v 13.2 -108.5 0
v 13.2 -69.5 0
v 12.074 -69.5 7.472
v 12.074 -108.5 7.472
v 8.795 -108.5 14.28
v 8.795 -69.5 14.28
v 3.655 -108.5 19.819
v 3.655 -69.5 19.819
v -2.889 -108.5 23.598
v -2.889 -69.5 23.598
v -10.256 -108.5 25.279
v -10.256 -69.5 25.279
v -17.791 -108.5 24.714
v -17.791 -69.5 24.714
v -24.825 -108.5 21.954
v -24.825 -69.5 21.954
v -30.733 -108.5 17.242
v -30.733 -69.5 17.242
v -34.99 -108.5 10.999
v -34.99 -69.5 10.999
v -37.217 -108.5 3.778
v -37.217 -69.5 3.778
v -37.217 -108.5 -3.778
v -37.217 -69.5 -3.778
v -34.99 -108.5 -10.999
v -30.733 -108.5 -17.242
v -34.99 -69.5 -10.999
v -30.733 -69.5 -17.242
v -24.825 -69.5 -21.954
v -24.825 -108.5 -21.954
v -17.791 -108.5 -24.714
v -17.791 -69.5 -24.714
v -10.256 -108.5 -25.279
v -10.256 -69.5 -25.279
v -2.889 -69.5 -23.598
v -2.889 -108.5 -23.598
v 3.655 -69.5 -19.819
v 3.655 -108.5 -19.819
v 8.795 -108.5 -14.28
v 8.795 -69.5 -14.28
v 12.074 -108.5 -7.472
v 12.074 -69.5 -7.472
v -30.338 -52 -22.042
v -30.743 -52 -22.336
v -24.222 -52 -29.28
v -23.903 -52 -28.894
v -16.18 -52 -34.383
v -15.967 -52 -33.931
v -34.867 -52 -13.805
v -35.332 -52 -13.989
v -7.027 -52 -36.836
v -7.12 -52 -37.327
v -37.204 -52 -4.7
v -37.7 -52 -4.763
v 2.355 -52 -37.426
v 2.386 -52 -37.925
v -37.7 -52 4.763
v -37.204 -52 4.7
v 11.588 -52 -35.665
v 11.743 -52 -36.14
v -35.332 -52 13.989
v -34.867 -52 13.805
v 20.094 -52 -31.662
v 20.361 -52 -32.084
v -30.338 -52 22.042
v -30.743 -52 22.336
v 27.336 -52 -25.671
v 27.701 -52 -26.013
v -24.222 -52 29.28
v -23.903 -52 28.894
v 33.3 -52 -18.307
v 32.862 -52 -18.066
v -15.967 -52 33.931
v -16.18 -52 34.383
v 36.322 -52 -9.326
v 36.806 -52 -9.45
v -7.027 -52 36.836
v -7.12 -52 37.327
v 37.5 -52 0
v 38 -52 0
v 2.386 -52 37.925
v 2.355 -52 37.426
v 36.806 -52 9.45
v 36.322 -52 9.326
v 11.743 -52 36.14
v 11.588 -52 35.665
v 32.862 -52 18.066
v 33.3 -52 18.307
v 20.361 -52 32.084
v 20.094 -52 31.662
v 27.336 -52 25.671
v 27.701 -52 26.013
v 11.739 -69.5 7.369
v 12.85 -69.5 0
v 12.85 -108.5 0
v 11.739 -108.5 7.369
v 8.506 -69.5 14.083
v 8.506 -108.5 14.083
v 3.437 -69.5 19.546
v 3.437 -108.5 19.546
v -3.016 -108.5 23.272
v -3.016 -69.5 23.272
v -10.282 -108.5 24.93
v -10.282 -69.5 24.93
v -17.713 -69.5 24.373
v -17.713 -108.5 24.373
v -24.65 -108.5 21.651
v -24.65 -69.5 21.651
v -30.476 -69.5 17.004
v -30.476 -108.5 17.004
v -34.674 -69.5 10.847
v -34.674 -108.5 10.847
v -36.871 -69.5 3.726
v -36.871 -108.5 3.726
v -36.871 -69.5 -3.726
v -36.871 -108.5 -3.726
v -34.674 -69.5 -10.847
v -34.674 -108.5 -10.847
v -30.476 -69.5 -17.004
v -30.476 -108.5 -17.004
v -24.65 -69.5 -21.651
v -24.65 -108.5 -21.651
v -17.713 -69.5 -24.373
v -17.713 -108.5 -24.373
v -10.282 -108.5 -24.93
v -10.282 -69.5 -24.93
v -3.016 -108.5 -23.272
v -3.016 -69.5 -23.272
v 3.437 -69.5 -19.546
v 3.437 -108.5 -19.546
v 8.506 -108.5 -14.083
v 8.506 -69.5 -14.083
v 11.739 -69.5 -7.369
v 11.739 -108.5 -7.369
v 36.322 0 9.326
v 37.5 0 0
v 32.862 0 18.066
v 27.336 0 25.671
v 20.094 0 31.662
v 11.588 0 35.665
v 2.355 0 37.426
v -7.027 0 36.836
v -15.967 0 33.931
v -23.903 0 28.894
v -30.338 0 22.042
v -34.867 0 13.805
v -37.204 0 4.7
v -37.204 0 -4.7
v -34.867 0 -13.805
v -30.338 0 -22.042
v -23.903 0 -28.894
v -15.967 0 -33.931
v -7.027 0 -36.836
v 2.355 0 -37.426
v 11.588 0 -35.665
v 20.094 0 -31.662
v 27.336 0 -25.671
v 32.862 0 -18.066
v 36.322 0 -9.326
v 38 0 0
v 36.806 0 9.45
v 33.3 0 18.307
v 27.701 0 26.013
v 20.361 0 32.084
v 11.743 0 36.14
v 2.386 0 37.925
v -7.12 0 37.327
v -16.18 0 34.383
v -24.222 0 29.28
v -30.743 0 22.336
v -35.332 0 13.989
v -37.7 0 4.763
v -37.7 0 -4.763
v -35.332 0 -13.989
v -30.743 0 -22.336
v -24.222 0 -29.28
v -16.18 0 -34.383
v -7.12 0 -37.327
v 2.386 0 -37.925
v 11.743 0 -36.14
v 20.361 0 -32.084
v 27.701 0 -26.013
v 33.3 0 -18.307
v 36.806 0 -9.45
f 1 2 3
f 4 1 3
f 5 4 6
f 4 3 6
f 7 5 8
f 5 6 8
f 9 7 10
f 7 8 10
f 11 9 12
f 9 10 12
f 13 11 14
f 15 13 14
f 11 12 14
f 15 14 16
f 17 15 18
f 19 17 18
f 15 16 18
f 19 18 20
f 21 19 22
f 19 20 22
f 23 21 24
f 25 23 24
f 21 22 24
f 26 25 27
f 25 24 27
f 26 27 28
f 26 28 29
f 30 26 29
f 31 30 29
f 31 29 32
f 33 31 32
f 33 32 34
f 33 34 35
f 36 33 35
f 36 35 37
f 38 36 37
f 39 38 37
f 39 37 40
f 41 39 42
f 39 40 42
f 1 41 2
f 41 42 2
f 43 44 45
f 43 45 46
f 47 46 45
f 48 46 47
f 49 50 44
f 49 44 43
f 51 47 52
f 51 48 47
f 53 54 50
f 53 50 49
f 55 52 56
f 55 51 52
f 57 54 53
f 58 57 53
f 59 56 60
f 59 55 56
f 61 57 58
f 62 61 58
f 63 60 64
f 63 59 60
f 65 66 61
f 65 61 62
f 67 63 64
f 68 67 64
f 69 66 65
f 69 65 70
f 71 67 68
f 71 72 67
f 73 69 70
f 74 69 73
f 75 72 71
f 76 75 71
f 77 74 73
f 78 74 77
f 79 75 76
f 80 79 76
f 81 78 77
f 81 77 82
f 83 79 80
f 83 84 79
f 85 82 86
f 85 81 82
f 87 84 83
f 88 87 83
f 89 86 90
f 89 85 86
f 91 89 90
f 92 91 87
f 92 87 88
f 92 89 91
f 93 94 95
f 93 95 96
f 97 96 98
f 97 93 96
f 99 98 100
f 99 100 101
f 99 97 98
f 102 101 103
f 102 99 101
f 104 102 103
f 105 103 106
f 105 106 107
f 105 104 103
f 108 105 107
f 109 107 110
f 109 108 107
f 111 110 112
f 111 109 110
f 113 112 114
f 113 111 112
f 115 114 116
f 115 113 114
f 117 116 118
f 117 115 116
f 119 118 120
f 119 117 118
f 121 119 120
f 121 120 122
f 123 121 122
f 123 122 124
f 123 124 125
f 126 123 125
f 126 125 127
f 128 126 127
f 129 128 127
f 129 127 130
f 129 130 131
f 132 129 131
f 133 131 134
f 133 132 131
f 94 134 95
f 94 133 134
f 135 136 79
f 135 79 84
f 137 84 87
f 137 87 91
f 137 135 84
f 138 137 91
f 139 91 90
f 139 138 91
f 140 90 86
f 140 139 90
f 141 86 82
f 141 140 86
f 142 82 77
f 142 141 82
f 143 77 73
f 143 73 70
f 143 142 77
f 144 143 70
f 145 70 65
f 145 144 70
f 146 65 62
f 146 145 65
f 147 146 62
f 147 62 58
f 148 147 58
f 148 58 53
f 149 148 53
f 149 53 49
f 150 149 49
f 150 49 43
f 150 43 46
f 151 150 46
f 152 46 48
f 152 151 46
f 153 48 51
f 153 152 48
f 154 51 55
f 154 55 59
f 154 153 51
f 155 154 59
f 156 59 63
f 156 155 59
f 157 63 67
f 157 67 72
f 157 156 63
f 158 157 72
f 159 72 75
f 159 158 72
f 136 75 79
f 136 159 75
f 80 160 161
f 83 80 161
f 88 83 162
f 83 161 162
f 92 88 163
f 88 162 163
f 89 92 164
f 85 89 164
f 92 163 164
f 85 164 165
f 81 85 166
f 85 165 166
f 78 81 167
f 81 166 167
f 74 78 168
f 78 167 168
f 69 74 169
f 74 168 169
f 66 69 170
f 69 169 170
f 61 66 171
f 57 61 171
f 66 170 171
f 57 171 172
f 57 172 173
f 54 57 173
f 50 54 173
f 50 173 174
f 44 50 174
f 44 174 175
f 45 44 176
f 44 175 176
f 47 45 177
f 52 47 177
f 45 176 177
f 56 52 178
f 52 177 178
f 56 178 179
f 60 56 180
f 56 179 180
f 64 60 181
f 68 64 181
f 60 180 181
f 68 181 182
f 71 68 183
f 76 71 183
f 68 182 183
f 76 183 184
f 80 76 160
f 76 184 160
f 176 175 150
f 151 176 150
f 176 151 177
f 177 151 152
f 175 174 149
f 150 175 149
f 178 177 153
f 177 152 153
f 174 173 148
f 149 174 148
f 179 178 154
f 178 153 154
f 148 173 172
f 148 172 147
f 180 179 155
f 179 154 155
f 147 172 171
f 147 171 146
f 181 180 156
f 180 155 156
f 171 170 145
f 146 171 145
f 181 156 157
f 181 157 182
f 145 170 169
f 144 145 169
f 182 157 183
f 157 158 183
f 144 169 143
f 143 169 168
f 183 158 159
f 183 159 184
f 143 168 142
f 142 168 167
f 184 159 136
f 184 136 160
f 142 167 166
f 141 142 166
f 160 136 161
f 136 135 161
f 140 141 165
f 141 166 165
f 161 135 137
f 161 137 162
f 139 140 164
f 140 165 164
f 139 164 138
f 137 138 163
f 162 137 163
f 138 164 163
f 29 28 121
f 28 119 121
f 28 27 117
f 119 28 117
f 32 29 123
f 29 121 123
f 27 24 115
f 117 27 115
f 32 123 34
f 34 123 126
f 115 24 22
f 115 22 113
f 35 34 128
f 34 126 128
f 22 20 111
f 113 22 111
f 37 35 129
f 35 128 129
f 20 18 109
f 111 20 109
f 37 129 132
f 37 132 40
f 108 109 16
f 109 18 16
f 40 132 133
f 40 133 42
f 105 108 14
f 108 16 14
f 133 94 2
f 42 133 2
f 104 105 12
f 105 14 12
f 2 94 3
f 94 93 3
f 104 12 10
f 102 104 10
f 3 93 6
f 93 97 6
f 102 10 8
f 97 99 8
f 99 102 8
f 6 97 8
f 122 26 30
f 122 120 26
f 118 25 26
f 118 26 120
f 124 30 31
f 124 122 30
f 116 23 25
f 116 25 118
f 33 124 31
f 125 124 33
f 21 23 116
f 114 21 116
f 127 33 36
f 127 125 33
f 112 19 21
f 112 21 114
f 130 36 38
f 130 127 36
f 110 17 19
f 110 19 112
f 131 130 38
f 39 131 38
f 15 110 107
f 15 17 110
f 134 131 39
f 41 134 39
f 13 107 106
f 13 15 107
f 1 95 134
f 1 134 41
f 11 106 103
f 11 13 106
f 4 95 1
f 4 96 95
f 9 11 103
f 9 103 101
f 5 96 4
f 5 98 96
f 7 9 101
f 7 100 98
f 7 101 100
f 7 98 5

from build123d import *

# Parameters (mm, degrees)
F0_R     = 38
F0_R_2   = 37.5
F1_DEPTH = 52
F3_R     = 25.35
F3_R_2   = 25
F4_DEPTH = 39


# Not quite as in the source:
# - the program builds the solid bodies; features that only make, move or delete a surface that nothing else refers to are left out


with BuildPart() as f1:
    # F0 (on Front) → F1 (new body)
    with BuildSketch(Plane.XZ):
        Circle(F0_R)
        Circle(F0_R_2, mode=Mode.SUBTRACT)
    extrude(amount=F1_DEPTH)


with BuildPart() as f4:
    # F3 (on offset) → F4 (new body)
    with BuildSketch(Plane.XZ.offset(69.5)):
        with Locations((-12.15, 0)):
            Circle(F3_R)
        with Locations((-12.15, 0)):
            Circle(F3_R_2, mode=Mode.SUBTRACT)
    extrude(amount=F4_DEPTH)


solid = Compound([f1.part, f4.part])
